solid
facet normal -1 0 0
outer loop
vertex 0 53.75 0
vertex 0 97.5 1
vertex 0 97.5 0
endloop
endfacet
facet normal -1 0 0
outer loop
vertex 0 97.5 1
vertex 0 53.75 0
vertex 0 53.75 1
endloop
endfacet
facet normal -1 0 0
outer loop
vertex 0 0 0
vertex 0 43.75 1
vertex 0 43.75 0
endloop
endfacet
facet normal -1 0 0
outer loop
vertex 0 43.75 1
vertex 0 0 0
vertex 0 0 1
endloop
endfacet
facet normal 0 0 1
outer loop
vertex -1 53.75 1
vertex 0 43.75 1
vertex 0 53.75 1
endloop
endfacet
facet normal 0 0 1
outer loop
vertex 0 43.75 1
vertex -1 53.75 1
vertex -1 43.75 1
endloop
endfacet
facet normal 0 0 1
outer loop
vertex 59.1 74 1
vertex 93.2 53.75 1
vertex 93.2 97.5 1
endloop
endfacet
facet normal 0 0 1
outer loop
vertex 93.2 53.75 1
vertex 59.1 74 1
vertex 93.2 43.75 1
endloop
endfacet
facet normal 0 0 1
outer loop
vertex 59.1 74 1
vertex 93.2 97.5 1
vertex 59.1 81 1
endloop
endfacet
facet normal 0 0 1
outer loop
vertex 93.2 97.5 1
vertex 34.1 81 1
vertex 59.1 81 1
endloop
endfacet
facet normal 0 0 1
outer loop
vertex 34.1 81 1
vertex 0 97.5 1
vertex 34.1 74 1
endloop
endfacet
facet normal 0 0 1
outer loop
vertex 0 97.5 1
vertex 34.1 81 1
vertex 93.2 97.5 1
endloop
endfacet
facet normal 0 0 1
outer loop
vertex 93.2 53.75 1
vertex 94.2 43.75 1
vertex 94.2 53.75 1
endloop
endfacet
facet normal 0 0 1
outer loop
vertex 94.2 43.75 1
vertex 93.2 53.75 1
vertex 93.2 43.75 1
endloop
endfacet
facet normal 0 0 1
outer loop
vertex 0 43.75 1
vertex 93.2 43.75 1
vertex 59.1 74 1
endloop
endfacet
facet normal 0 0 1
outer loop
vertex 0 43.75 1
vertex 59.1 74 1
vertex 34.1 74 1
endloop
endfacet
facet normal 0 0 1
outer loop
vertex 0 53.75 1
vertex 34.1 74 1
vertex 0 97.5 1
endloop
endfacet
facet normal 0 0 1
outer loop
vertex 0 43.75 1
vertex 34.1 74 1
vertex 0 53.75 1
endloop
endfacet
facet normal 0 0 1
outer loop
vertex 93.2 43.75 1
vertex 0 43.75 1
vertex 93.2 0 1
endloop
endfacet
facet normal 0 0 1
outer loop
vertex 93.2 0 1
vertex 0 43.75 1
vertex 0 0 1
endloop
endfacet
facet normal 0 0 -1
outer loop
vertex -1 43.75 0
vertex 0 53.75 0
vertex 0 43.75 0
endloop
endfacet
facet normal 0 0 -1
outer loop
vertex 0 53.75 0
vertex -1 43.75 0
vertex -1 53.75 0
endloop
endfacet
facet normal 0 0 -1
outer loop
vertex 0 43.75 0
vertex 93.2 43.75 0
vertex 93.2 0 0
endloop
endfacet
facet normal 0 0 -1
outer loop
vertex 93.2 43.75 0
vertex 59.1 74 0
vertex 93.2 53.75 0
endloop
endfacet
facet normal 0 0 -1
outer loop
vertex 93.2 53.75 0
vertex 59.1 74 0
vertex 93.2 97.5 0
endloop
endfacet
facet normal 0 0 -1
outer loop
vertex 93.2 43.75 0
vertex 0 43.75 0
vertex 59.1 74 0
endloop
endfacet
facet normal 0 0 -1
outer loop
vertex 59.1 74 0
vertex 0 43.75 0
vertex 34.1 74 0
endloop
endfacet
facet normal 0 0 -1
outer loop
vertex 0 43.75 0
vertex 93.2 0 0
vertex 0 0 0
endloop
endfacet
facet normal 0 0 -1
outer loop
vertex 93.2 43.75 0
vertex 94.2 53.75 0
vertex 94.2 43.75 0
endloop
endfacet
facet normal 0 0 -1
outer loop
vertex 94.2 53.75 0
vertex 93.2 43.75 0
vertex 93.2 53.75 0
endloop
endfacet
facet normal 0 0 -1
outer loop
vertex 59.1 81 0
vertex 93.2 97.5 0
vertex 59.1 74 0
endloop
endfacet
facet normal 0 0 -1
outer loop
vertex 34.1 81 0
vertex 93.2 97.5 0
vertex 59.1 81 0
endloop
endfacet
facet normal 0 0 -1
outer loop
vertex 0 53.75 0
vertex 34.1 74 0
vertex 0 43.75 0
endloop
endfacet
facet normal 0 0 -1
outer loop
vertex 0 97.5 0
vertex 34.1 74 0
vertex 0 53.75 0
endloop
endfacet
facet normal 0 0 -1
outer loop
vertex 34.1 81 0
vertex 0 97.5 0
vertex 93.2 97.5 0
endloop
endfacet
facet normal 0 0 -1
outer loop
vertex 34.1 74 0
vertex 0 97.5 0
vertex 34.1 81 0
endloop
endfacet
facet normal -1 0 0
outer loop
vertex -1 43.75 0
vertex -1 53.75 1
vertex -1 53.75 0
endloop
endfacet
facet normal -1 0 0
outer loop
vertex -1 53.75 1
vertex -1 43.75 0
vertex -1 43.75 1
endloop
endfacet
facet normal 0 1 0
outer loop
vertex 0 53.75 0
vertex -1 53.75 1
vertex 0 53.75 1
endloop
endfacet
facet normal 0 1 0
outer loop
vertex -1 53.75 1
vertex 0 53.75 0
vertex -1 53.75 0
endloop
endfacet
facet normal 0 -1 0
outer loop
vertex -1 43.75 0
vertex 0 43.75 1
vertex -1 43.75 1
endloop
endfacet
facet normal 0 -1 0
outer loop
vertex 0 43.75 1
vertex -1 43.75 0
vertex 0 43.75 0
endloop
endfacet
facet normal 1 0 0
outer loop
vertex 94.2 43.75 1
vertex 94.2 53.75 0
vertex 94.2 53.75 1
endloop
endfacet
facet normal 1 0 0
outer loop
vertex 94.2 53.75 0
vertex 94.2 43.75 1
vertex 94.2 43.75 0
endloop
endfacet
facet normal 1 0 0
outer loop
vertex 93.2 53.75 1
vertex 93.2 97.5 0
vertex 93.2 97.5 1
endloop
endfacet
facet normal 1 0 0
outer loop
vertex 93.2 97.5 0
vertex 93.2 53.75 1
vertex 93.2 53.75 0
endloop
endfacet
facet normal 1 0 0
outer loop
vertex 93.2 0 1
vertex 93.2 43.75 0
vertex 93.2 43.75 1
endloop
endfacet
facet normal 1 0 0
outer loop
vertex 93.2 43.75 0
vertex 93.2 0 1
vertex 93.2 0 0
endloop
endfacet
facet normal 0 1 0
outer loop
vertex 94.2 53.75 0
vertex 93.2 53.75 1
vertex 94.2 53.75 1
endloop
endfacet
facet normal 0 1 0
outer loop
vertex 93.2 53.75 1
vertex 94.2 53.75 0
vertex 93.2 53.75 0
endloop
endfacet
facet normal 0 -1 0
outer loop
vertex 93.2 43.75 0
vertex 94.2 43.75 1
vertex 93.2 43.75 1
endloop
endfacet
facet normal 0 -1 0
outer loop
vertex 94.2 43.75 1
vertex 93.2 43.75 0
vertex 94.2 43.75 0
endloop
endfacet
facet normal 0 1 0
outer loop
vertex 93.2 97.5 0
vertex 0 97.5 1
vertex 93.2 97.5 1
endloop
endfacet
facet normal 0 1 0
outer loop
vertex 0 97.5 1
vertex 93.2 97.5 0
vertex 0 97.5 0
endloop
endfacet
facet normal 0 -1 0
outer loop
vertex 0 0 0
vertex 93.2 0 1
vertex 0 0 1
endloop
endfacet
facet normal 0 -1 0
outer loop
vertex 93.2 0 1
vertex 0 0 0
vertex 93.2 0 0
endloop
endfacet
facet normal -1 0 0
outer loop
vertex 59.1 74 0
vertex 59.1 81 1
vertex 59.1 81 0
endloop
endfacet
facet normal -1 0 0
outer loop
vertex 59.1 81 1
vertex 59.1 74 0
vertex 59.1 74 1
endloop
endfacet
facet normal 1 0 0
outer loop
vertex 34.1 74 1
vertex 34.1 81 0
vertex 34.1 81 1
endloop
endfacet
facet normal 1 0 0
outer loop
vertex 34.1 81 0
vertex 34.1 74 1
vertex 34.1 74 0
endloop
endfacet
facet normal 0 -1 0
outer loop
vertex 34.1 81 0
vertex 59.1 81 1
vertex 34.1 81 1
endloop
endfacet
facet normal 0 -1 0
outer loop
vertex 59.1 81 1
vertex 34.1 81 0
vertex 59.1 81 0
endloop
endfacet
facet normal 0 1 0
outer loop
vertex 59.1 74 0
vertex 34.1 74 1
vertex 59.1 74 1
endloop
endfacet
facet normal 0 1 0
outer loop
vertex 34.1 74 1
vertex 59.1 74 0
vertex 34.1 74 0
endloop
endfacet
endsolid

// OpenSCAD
difference(){
union() {
translate([46.6, 48.75, 0.5]) cube([93.2, 97.5, 1.0], center = true);
union() {
translate([-0.5, 48.75, 0.5]) cube([1.0, 10.0, 1.0], center = true);
translate([93.7, 48.75, 0.5]) cube([1.0, 10.0, 1.0], center = true);
}
}
translate([46.6, 77.5, 0.5]) cube([25.0, 7.0, 1.0], center = true);
}
